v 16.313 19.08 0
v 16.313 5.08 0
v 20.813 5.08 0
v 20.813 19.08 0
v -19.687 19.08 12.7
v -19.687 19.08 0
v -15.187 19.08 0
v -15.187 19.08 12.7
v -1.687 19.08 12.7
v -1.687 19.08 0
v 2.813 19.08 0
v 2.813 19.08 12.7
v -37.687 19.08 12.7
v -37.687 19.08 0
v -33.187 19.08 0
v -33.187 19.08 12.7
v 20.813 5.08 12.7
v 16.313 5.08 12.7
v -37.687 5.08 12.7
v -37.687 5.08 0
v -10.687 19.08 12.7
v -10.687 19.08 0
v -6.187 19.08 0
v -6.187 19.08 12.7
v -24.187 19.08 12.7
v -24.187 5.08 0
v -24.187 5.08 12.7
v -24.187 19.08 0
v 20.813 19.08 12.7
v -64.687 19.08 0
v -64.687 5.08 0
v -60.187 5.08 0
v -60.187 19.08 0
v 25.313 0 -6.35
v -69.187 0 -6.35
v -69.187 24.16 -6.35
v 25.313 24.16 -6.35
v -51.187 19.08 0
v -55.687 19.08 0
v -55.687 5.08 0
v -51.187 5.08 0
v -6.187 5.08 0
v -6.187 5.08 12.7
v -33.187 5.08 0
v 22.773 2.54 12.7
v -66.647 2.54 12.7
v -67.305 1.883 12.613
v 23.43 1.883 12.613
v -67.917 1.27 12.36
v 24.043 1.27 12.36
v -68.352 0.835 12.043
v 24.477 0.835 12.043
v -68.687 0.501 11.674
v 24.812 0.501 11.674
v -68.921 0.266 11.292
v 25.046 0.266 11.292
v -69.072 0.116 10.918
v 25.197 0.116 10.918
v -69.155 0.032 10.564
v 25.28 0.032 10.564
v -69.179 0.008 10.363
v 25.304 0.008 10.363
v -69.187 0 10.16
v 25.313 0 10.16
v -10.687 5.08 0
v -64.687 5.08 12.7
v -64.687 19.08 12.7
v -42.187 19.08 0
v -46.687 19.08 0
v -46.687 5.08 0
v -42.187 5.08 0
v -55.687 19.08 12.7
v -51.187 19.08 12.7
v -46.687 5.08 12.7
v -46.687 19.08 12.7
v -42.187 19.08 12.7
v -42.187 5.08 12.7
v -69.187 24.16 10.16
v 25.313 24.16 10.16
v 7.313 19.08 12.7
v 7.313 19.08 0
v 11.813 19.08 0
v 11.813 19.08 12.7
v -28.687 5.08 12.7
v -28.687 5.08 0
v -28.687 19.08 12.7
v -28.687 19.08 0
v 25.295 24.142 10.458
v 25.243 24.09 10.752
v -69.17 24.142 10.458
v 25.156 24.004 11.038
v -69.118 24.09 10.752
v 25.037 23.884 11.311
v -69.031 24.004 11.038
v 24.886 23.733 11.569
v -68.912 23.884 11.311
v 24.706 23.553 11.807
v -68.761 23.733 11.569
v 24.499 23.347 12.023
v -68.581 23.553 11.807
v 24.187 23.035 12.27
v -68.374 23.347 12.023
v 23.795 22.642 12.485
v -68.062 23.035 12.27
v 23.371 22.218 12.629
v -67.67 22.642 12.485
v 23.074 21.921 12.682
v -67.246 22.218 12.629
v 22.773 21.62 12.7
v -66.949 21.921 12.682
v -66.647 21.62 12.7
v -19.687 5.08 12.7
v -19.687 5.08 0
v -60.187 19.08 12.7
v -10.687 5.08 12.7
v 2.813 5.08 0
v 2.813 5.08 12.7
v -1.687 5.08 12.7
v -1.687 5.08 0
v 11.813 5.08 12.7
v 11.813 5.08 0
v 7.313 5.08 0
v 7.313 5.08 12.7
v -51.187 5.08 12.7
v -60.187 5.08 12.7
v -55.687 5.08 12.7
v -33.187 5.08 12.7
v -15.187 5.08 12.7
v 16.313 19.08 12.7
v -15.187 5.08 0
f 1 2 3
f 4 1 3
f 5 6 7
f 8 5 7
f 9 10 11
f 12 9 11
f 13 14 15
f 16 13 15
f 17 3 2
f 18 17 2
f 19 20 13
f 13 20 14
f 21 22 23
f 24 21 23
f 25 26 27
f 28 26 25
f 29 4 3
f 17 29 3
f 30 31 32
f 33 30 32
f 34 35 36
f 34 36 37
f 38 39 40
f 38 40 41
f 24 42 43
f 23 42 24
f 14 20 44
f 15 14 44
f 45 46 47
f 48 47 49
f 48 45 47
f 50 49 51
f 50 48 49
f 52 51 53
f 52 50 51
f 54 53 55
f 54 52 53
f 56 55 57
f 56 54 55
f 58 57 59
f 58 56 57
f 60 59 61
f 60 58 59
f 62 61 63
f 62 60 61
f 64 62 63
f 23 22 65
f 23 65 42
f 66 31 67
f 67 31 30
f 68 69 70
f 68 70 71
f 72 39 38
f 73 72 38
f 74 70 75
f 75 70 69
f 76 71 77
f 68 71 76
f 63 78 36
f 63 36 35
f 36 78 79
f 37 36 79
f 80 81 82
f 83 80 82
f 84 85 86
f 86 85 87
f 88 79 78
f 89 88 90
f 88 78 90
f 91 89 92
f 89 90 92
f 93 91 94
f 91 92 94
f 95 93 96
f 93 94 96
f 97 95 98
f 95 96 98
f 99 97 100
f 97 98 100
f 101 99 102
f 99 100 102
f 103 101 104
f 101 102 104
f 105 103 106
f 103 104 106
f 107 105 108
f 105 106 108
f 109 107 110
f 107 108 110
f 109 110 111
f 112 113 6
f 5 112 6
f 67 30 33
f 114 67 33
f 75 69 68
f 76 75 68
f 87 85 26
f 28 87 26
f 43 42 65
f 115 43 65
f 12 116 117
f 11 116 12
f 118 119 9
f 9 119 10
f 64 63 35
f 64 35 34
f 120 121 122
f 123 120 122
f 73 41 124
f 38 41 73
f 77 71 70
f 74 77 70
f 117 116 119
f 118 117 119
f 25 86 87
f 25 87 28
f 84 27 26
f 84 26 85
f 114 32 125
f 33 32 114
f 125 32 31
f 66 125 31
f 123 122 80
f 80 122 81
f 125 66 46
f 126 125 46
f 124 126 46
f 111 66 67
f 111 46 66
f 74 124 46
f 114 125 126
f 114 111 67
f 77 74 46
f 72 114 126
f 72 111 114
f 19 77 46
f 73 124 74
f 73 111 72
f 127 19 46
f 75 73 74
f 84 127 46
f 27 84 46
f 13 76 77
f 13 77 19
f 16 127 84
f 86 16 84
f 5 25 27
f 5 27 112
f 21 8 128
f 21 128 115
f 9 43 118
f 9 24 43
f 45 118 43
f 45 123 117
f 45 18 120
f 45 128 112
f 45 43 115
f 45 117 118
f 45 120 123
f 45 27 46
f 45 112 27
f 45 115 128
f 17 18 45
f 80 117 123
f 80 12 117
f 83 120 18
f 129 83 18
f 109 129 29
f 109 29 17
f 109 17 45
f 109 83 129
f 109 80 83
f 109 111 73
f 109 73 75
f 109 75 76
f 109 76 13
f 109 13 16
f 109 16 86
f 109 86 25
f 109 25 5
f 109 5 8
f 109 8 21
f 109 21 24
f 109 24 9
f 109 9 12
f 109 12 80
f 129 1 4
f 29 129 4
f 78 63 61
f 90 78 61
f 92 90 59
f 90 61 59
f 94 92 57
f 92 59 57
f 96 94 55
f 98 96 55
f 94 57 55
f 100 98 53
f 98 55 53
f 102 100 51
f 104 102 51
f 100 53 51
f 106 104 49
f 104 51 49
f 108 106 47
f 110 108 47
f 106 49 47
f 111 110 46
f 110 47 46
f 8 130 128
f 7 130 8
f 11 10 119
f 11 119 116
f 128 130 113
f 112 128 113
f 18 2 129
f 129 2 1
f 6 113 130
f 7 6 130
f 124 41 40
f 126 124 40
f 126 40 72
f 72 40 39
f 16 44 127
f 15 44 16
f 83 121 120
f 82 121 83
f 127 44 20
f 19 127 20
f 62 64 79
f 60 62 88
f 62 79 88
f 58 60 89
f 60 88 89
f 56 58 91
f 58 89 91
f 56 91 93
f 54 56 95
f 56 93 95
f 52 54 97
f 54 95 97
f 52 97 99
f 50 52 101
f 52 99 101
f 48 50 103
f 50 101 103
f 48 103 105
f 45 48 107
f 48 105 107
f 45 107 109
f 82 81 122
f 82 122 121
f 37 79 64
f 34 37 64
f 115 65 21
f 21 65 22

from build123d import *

# Parameters (mm, degrees)
F0_W     = 4.5000037
F0_H     = 13.9999974
F0_W_2   = 4.499991
F0_H_2   = 5.08
F0_W_3   = 4.5000164
F1_DEPTH = 12.7
F2_W     = 94.500065
F2_H     = 24.1599974
F3_DEPTH = 6.35
F4_R     = 2.54


with BuildPart() as f1:
    # F0 (on Top) → F1 (new body)
    with BuildSketch(Plane.XY):
        Polygon((-64.6874586299, 19.0799974), (-60.1874549299, 19.0799974), (-60.1874549299, 24.1599974), (-69.1874623299, 24.1599974), (-69.1874623299, 19.0799974), align=None)
        with Locations((-66.9374604799, 12.0799987)):
            Rectangle(F0_W, F0_H)
        Polygon((-69.1874623299, 0), (-60.1874549299, 0), (-60.1874549299, 5.08), (-64.6874586299, 5.08), (-69.1874623299, 5.08), align=None)
        Polygon((-60.1874549299, 0), (-51.1874475299, 0), (-51.1874475299, 5.08), (-55.6874512299, 5.08), (-60.1874549299, 5.08), align=None)
        with Locations((-57.9374530799, 12.0799987)):
            Rectangle(F0_W, F0_H)
        Polygon((-55.6874512299, 19.0799974), (-51.1874475299, 19.0799974), (-51.1874475299, 24.1599974), (-60.1874549299, 24.1599974), (-60.1874549299, 19.0799974), align=None)
        Polygon((-46.6874438299, 19.0799974), (-42.1874401299, 19.0799974), (-42.1874401299, 24.1599974), (-51.1874475299, 24.1599974), (-51.1874475299, 19.0799974), align=None)
        with Locations((-48.9374456799, 12.0799987)):
            Rectangle(F0_W, F0_H)
        Polygon((-51.1874475299, 0), (-42.1874401299, 0), (-42.1874401299, 5.08), (-46.6874438299, 5.08), (-51.1874475299, 5.08), align=None)
        Polygon((-42.1874401299, 0), (-33.1874327299, 0), (-33.1874327299, 5.08), (-37.6874364299, 5.08), (-42.1874401299, 5.08), align=None)
        with Locations((-39.9374382799, 12.0799987)):
            Rectangle(F0_W, F0_H)
        Polygon((-37.6874364299, 19.0799974), (-33.1874327299, 19.0799974), (-33.1874327299, 24.1599974), (-42.1874401299, 24.1599974), (-42.1874401299, 19.0799974), align=None)
        Polygon((-28.6874290299, 19.0799974), (-24.1874253299, 19.0799974), (-24.1874253299, 24.1599974), (-33.1874327299, 24.1599974), (-33.1874327299, 19.0799974), align=None)
        with Locations((-30.9374308799, 12.0799987)):
            Rectangle(F0_W, F0_H)
        Polygon((-33.1874327299, 0), (-24.1874253299, 0), (-24.1874253299, 5.08), (-28.6874290299, 5.08), (-33.1874327299, 5.08), align=None)
        with Locations((-21.9374298299, 12.0799987)):
            Rectangle(F0_W_2, F0_H)
        with Locations((-21.9374298299, 2.54)):
            Rectangle(F0_W_2, F0_H_2)
        with Locations((-17.4374261299, 2.54)):
            Rectangle(F0_W_3, F0_H_2)
        Polygon((-24.1874253299, 24.1599974), (-24.1874253299, 19.0799974), (-19.6874343299, 19.0799974), (-15.1874179299, 19.0799974), (-15.1874179299, 24.1599974), align=None)
        Polygon((-15.1874179299, 5.08), (-15.1874179299, 0), (-6.1874105299, 0), (-6.1874105299, 5.08), (-10.6874142299, 5.08), align=None)
        with Locations((-12.9374160799, 12.0799987)):
            Rectangle(F0_W, F0_H)
        Polygon((-15.1874179299, 24.1599974), (-15.1874179299, 19.0799974), (-10.6874142299, 19.0799974), (-6.1874105299, 19.0799974), (-6.1874105299, 24.1599974), align=None)
        Polygon((-6.1874105299, 24.1599974), (-6.1874105299, 19.0799974), (-1.6874068299, 19.0799974), (2.8125968701, 19.0799974), (2.8125968701, 24.1599974), align=None)
        with Locations((-3.9374086799, 12.0799987)):
            Rectangle(F0_W, F0_H)
        Polygon((-6.1874105299, 5.08), (-6.1874105299, 0), (2.8125968701, 0), (2.8125968701, 5.08), (-1.6874068299, 5.08), align=None)
        Polygon((2.8125968701, 5.08), (2.8125968701, 0), (11.8126042701, 0), (11.8126042701, 5.08), (7.3126005701, 5.08), align=None)
        with Locations((5.0625987201, 12.0799987)):
            Rectangle(F0_W, F0_H)
        Polygon((2.8125968701, 24.1599974), (2.8125968701, 19.0799974), (7.3126005701, 19.0799974), (11.8126042701, 19.0799974), (11.8126042701, 24.1599974), align=None)
        Polygon((11.8126042701, 24.1599974), (11.8126042701, 19.0799974), (16.3126079701, 19.0799974), (20.8126116701, 19.0799974), (20.8126116701, 24.1599974), align=None)
        with Locations((14.0626061201, 12.0799987)):
            Rectangle(F0_W, F0_H)
        Polygon((11.8126042701, 5.08), (11.8126042701, 0), (20.8126116701, 0), (20.8126116701, 5.08), (16.3126079701, 5.08), align=None)
        Polygon((20.8126116701, 5.08), (20.8126116701, 0), (25.3126026701, 0), (25.3126026701, 24.1599974), (20.8126116701, 24.1599974), (20.8126116701, 19.0799974), align=None)
    extrude(amount=F1_DEPTH)

    # F2 (on face) → F3 (join)
    with BuildSketch(Plane(origin=(0, 0, 0), x_dir=(1, 0, 0), z_dir=(0, 0, -1))):
        with Locations((-21.9374298299, -12.0799987)):
            Rectangle(F2_W, F2_H)
    extrude(amount=F3_DEPTH)

    # F4
    f4_edges = [f1.edges().sort_by_distance(p)[0] for p in [
        (-21.93743, 24.159997, 12.7),
        (-21.93743, 0, 12.7),
        (-69.187462, 12.079999, 12.7),
        (25.312603, 12.079999, 12.7),
    ]]
    fillet(f4_edges, radius=F4_R)


solid = f1.part
